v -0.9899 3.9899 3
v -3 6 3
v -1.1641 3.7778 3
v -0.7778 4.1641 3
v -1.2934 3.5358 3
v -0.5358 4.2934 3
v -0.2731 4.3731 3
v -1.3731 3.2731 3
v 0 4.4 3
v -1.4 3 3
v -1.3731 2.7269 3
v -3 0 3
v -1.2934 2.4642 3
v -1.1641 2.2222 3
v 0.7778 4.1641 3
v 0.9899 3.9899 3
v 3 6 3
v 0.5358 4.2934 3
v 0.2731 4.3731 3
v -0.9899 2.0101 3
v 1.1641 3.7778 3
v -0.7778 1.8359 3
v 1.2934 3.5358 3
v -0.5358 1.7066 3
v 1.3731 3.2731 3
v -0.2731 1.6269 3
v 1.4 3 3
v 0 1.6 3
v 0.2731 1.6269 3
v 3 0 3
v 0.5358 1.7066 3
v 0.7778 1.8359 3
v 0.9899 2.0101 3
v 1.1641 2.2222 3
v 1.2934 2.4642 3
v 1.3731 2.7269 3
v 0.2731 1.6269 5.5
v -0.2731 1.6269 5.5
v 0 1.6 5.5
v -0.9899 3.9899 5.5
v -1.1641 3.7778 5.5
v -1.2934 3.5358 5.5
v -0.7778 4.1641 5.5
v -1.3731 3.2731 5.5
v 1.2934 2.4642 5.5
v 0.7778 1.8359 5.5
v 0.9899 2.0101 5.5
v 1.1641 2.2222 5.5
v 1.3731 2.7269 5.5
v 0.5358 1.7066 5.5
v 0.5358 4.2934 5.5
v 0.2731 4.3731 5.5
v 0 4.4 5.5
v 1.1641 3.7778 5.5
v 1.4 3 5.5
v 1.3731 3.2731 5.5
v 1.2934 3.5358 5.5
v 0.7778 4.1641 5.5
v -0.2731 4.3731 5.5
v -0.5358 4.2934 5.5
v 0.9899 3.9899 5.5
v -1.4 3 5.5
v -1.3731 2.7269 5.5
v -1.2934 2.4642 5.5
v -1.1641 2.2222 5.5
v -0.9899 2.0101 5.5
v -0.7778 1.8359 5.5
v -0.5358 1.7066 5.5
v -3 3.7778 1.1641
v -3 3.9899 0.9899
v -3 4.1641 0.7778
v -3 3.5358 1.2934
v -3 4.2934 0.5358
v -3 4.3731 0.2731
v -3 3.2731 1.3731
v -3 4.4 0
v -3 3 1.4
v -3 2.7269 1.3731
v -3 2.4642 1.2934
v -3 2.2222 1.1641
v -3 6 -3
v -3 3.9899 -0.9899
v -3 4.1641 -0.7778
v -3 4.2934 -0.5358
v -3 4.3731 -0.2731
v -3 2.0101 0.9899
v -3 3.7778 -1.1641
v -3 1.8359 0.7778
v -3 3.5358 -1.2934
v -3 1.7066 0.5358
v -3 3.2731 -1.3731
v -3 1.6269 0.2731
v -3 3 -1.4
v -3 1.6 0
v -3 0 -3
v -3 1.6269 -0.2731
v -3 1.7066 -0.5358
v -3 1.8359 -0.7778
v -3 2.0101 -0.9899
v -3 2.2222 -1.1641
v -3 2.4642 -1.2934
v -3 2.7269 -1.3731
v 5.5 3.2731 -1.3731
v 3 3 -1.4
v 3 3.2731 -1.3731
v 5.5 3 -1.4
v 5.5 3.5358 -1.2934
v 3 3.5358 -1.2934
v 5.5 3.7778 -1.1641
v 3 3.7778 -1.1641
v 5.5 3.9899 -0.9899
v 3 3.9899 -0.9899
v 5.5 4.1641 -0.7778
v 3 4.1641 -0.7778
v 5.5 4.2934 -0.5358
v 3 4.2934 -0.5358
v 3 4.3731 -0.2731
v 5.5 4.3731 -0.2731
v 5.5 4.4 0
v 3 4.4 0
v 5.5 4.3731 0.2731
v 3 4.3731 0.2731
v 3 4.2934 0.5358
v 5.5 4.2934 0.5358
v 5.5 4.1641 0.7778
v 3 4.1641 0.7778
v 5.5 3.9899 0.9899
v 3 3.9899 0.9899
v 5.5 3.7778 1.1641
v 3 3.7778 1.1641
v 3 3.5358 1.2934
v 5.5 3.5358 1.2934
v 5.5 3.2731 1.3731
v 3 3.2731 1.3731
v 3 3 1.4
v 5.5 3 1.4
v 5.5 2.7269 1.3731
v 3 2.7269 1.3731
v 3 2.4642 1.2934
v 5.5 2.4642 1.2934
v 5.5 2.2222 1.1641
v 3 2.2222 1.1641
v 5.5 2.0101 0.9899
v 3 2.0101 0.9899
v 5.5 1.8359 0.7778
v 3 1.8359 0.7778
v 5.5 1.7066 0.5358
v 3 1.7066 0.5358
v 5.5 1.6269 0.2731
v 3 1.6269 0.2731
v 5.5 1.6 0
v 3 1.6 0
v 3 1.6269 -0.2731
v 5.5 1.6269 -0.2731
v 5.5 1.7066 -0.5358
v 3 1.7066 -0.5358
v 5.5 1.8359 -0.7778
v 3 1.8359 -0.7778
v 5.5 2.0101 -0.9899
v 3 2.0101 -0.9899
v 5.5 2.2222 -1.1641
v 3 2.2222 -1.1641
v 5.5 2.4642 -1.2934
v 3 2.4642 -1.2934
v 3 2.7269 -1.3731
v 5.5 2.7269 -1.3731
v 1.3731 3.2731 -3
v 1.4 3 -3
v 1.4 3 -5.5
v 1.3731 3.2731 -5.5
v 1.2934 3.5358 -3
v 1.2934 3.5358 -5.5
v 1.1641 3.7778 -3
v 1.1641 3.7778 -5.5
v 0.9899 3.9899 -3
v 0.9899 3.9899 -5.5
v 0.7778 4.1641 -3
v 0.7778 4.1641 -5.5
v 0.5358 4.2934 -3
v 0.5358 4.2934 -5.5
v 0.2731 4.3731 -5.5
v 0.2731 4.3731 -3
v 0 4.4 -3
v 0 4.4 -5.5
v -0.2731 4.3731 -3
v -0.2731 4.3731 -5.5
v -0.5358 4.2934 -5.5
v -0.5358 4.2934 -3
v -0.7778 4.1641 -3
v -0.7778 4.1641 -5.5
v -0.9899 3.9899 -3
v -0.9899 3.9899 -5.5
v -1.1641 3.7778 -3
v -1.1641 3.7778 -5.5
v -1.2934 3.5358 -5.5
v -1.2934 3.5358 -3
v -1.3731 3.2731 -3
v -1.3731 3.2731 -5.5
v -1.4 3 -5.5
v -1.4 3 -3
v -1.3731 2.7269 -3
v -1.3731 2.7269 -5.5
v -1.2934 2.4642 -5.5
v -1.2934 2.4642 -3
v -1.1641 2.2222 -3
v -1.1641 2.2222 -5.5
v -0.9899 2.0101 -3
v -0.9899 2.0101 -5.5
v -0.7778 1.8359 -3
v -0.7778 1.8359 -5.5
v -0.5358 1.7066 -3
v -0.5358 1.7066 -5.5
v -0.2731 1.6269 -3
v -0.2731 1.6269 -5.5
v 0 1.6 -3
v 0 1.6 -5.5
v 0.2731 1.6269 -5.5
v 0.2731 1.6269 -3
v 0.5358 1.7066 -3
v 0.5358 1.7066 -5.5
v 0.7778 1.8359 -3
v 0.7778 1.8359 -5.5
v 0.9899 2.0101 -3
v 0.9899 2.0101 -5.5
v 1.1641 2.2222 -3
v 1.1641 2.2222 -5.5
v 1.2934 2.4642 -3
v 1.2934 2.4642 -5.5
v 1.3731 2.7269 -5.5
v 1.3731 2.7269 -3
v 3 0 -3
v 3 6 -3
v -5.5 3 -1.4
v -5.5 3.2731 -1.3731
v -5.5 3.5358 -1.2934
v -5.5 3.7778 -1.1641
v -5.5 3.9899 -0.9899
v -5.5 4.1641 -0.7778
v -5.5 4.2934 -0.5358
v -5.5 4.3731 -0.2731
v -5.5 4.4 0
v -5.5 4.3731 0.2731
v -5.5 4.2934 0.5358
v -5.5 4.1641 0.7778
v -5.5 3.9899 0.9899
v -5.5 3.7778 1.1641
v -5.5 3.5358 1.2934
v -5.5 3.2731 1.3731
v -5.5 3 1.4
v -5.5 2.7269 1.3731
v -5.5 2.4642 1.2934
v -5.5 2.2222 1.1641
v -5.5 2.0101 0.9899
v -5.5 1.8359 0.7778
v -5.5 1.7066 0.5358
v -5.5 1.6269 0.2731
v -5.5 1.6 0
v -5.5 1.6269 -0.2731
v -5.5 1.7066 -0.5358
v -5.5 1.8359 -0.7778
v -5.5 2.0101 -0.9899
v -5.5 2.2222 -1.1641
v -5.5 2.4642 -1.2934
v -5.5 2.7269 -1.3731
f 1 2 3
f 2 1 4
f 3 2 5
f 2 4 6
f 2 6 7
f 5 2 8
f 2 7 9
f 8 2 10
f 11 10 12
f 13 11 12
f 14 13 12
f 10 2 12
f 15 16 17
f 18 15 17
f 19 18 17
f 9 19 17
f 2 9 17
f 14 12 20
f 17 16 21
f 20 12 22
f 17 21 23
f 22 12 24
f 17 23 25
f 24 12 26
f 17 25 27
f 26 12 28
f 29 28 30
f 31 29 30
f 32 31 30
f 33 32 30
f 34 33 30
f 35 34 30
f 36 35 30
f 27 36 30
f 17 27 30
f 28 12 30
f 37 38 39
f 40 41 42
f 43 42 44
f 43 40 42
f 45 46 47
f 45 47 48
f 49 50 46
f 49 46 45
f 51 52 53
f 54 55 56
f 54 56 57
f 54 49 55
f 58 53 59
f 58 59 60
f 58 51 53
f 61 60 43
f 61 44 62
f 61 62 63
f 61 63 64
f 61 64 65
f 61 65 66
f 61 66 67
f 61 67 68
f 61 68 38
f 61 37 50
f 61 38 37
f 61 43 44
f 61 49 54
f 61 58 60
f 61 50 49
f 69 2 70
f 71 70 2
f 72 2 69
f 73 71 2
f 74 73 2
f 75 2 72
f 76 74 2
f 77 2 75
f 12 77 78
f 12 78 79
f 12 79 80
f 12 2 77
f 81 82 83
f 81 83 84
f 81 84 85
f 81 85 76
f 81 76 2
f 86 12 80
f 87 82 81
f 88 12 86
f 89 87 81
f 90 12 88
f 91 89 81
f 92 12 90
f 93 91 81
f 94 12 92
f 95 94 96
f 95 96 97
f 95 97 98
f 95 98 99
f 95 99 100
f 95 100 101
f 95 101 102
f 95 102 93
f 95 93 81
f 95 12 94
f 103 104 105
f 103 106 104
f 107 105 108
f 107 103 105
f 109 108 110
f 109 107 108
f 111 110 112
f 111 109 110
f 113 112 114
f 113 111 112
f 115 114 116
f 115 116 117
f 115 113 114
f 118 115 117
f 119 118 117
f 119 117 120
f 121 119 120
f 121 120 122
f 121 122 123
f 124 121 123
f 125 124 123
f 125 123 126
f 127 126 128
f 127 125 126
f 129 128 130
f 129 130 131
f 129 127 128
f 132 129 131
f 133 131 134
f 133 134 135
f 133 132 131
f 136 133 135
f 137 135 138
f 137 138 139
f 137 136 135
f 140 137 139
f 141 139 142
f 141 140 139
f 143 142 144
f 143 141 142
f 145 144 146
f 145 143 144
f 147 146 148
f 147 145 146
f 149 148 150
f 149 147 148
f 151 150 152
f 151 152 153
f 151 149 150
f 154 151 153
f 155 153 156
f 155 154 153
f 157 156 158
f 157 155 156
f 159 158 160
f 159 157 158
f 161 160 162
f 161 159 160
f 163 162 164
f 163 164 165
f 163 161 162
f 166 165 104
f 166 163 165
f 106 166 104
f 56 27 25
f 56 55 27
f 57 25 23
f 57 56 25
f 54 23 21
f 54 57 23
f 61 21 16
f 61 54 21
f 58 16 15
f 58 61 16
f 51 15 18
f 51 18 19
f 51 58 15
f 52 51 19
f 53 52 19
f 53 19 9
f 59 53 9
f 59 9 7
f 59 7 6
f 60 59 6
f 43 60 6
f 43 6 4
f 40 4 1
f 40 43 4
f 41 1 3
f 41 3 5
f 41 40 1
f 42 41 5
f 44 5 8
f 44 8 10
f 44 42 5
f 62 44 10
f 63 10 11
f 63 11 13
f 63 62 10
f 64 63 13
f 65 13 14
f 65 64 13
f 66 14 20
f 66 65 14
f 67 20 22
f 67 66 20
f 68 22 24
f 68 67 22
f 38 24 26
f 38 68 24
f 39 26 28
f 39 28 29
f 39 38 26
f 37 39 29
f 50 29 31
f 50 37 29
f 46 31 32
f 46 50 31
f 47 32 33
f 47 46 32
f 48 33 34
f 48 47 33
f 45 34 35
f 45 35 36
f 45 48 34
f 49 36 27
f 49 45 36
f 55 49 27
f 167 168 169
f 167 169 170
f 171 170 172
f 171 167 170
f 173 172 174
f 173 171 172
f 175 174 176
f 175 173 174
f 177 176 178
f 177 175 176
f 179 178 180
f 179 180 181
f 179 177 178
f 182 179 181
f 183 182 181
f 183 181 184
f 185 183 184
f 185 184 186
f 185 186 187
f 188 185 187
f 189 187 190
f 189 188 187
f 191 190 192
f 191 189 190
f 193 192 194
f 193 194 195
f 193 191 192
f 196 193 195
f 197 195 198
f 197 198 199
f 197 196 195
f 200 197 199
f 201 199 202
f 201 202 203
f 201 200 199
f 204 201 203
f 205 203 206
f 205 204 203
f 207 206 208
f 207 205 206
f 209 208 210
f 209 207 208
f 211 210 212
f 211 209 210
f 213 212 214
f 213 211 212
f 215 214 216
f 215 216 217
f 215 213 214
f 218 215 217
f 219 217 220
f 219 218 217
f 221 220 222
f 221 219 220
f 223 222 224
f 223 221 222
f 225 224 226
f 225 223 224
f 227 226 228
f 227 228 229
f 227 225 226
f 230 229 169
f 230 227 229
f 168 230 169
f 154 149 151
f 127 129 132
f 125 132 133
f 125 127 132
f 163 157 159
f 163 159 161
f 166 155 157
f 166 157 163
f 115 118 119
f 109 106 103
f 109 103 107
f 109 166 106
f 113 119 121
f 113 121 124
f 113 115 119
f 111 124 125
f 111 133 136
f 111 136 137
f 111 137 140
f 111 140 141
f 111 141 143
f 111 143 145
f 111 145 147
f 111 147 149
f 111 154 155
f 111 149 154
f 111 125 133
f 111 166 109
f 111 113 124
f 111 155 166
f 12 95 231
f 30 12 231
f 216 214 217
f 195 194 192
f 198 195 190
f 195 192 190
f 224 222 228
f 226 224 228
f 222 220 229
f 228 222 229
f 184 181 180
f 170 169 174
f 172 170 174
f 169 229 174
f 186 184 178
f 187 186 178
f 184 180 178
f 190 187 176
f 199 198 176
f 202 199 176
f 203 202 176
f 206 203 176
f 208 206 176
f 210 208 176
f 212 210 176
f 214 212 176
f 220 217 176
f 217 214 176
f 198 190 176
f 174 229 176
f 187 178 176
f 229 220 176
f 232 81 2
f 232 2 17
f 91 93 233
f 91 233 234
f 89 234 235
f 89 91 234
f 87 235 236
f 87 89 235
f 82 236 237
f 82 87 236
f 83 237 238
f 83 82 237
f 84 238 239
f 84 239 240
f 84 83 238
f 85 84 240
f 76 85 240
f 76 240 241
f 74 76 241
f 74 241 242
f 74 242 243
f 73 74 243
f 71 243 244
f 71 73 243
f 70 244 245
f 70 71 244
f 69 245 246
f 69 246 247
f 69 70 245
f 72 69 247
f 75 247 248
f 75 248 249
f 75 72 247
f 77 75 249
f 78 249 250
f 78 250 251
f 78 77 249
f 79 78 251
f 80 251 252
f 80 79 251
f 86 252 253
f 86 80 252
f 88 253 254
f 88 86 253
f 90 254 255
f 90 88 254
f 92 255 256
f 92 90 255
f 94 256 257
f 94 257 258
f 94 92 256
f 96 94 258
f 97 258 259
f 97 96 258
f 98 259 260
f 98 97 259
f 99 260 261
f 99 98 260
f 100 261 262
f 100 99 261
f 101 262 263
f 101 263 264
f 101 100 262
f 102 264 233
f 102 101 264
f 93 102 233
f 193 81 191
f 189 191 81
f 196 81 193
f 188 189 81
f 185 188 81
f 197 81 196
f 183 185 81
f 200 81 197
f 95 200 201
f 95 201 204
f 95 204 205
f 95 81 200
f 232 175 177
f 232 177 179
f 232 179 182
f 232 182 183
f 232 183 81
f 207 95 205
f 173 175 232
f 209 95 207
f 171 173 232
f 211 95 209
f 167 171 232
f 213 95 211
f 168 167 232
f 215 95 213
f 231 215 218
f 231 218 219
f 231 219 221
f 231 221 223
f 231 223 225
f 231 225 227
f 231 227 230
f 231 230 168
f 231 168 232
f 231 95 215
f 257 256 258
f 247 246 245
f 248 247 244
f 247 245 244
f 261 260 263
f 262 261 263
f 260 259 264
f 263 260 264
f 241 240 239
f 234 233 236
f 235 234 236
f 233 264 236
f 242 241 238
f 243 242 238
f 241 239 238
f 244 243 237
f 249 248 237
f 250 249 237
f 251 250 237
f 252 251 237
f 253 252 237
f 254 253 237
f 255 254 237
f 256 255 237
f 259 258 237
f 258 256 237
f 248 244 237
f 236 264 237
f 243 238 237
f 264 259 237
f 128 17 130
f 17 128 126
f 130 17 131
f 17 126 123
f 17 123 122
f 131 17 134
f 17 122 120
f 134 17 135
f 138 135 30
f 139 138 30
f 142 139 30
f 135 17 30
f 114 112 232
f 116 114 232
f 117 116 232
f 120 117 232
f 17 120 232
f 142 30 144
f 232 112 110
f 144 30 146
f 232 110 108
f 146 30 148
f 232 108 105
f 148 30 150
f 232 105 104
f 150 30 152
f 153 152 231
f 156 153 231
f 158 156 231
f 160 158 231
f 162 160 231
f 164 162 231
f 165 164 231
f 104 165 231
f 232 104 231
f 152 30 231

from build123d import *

# Parameters (mm, degrees)
SKETCH_1_W      = 6
SKETCH_1_H      = 6
EXTRUDE_1_DEPTH = 6
SKETCH_2_R      = 1.4
EXTRUDE_2_DEPTH = 5.5
SKETCH_3_R      = 1.4
EXTRUDE_3_DEPTH = 5.5


with BuildPart() as part:
    # 草图1 → 凸台-拉伸1 (new body)
    with BuildSketch(Plane(origin=(0, 0, 0), x_dir=(1, 0, 0), z_dir=(0, 1, 0))):
        Rectangle(SKETCH_1_W, SKETCH_1_H)
    extrude(amount=EXTRUDE_1_DEPTH)

    # 草图2 → 凸台-拉伸2 (add, symmetric)
    with BuildSketch(Plane.XY):
        with Locations((0, 3)):
            Circle(SKETCH_2_R)
    extrude(amount=EXTRUDE_2_DEPTH, both=True)

    # 草图3 → 凸台-拉伸3 (add, symmetric)
    with BuildSketch(Plane(origin=(0, 0, 0), x_dir=(0, 0, -1), z_dir=(1, 0, 0))):
        with Locations((0, 3)):
            Circle(SKETCH_3_R)
    extrude(amount=EXTRUDE_3_DEPTH, both=True)


solid = part.part
